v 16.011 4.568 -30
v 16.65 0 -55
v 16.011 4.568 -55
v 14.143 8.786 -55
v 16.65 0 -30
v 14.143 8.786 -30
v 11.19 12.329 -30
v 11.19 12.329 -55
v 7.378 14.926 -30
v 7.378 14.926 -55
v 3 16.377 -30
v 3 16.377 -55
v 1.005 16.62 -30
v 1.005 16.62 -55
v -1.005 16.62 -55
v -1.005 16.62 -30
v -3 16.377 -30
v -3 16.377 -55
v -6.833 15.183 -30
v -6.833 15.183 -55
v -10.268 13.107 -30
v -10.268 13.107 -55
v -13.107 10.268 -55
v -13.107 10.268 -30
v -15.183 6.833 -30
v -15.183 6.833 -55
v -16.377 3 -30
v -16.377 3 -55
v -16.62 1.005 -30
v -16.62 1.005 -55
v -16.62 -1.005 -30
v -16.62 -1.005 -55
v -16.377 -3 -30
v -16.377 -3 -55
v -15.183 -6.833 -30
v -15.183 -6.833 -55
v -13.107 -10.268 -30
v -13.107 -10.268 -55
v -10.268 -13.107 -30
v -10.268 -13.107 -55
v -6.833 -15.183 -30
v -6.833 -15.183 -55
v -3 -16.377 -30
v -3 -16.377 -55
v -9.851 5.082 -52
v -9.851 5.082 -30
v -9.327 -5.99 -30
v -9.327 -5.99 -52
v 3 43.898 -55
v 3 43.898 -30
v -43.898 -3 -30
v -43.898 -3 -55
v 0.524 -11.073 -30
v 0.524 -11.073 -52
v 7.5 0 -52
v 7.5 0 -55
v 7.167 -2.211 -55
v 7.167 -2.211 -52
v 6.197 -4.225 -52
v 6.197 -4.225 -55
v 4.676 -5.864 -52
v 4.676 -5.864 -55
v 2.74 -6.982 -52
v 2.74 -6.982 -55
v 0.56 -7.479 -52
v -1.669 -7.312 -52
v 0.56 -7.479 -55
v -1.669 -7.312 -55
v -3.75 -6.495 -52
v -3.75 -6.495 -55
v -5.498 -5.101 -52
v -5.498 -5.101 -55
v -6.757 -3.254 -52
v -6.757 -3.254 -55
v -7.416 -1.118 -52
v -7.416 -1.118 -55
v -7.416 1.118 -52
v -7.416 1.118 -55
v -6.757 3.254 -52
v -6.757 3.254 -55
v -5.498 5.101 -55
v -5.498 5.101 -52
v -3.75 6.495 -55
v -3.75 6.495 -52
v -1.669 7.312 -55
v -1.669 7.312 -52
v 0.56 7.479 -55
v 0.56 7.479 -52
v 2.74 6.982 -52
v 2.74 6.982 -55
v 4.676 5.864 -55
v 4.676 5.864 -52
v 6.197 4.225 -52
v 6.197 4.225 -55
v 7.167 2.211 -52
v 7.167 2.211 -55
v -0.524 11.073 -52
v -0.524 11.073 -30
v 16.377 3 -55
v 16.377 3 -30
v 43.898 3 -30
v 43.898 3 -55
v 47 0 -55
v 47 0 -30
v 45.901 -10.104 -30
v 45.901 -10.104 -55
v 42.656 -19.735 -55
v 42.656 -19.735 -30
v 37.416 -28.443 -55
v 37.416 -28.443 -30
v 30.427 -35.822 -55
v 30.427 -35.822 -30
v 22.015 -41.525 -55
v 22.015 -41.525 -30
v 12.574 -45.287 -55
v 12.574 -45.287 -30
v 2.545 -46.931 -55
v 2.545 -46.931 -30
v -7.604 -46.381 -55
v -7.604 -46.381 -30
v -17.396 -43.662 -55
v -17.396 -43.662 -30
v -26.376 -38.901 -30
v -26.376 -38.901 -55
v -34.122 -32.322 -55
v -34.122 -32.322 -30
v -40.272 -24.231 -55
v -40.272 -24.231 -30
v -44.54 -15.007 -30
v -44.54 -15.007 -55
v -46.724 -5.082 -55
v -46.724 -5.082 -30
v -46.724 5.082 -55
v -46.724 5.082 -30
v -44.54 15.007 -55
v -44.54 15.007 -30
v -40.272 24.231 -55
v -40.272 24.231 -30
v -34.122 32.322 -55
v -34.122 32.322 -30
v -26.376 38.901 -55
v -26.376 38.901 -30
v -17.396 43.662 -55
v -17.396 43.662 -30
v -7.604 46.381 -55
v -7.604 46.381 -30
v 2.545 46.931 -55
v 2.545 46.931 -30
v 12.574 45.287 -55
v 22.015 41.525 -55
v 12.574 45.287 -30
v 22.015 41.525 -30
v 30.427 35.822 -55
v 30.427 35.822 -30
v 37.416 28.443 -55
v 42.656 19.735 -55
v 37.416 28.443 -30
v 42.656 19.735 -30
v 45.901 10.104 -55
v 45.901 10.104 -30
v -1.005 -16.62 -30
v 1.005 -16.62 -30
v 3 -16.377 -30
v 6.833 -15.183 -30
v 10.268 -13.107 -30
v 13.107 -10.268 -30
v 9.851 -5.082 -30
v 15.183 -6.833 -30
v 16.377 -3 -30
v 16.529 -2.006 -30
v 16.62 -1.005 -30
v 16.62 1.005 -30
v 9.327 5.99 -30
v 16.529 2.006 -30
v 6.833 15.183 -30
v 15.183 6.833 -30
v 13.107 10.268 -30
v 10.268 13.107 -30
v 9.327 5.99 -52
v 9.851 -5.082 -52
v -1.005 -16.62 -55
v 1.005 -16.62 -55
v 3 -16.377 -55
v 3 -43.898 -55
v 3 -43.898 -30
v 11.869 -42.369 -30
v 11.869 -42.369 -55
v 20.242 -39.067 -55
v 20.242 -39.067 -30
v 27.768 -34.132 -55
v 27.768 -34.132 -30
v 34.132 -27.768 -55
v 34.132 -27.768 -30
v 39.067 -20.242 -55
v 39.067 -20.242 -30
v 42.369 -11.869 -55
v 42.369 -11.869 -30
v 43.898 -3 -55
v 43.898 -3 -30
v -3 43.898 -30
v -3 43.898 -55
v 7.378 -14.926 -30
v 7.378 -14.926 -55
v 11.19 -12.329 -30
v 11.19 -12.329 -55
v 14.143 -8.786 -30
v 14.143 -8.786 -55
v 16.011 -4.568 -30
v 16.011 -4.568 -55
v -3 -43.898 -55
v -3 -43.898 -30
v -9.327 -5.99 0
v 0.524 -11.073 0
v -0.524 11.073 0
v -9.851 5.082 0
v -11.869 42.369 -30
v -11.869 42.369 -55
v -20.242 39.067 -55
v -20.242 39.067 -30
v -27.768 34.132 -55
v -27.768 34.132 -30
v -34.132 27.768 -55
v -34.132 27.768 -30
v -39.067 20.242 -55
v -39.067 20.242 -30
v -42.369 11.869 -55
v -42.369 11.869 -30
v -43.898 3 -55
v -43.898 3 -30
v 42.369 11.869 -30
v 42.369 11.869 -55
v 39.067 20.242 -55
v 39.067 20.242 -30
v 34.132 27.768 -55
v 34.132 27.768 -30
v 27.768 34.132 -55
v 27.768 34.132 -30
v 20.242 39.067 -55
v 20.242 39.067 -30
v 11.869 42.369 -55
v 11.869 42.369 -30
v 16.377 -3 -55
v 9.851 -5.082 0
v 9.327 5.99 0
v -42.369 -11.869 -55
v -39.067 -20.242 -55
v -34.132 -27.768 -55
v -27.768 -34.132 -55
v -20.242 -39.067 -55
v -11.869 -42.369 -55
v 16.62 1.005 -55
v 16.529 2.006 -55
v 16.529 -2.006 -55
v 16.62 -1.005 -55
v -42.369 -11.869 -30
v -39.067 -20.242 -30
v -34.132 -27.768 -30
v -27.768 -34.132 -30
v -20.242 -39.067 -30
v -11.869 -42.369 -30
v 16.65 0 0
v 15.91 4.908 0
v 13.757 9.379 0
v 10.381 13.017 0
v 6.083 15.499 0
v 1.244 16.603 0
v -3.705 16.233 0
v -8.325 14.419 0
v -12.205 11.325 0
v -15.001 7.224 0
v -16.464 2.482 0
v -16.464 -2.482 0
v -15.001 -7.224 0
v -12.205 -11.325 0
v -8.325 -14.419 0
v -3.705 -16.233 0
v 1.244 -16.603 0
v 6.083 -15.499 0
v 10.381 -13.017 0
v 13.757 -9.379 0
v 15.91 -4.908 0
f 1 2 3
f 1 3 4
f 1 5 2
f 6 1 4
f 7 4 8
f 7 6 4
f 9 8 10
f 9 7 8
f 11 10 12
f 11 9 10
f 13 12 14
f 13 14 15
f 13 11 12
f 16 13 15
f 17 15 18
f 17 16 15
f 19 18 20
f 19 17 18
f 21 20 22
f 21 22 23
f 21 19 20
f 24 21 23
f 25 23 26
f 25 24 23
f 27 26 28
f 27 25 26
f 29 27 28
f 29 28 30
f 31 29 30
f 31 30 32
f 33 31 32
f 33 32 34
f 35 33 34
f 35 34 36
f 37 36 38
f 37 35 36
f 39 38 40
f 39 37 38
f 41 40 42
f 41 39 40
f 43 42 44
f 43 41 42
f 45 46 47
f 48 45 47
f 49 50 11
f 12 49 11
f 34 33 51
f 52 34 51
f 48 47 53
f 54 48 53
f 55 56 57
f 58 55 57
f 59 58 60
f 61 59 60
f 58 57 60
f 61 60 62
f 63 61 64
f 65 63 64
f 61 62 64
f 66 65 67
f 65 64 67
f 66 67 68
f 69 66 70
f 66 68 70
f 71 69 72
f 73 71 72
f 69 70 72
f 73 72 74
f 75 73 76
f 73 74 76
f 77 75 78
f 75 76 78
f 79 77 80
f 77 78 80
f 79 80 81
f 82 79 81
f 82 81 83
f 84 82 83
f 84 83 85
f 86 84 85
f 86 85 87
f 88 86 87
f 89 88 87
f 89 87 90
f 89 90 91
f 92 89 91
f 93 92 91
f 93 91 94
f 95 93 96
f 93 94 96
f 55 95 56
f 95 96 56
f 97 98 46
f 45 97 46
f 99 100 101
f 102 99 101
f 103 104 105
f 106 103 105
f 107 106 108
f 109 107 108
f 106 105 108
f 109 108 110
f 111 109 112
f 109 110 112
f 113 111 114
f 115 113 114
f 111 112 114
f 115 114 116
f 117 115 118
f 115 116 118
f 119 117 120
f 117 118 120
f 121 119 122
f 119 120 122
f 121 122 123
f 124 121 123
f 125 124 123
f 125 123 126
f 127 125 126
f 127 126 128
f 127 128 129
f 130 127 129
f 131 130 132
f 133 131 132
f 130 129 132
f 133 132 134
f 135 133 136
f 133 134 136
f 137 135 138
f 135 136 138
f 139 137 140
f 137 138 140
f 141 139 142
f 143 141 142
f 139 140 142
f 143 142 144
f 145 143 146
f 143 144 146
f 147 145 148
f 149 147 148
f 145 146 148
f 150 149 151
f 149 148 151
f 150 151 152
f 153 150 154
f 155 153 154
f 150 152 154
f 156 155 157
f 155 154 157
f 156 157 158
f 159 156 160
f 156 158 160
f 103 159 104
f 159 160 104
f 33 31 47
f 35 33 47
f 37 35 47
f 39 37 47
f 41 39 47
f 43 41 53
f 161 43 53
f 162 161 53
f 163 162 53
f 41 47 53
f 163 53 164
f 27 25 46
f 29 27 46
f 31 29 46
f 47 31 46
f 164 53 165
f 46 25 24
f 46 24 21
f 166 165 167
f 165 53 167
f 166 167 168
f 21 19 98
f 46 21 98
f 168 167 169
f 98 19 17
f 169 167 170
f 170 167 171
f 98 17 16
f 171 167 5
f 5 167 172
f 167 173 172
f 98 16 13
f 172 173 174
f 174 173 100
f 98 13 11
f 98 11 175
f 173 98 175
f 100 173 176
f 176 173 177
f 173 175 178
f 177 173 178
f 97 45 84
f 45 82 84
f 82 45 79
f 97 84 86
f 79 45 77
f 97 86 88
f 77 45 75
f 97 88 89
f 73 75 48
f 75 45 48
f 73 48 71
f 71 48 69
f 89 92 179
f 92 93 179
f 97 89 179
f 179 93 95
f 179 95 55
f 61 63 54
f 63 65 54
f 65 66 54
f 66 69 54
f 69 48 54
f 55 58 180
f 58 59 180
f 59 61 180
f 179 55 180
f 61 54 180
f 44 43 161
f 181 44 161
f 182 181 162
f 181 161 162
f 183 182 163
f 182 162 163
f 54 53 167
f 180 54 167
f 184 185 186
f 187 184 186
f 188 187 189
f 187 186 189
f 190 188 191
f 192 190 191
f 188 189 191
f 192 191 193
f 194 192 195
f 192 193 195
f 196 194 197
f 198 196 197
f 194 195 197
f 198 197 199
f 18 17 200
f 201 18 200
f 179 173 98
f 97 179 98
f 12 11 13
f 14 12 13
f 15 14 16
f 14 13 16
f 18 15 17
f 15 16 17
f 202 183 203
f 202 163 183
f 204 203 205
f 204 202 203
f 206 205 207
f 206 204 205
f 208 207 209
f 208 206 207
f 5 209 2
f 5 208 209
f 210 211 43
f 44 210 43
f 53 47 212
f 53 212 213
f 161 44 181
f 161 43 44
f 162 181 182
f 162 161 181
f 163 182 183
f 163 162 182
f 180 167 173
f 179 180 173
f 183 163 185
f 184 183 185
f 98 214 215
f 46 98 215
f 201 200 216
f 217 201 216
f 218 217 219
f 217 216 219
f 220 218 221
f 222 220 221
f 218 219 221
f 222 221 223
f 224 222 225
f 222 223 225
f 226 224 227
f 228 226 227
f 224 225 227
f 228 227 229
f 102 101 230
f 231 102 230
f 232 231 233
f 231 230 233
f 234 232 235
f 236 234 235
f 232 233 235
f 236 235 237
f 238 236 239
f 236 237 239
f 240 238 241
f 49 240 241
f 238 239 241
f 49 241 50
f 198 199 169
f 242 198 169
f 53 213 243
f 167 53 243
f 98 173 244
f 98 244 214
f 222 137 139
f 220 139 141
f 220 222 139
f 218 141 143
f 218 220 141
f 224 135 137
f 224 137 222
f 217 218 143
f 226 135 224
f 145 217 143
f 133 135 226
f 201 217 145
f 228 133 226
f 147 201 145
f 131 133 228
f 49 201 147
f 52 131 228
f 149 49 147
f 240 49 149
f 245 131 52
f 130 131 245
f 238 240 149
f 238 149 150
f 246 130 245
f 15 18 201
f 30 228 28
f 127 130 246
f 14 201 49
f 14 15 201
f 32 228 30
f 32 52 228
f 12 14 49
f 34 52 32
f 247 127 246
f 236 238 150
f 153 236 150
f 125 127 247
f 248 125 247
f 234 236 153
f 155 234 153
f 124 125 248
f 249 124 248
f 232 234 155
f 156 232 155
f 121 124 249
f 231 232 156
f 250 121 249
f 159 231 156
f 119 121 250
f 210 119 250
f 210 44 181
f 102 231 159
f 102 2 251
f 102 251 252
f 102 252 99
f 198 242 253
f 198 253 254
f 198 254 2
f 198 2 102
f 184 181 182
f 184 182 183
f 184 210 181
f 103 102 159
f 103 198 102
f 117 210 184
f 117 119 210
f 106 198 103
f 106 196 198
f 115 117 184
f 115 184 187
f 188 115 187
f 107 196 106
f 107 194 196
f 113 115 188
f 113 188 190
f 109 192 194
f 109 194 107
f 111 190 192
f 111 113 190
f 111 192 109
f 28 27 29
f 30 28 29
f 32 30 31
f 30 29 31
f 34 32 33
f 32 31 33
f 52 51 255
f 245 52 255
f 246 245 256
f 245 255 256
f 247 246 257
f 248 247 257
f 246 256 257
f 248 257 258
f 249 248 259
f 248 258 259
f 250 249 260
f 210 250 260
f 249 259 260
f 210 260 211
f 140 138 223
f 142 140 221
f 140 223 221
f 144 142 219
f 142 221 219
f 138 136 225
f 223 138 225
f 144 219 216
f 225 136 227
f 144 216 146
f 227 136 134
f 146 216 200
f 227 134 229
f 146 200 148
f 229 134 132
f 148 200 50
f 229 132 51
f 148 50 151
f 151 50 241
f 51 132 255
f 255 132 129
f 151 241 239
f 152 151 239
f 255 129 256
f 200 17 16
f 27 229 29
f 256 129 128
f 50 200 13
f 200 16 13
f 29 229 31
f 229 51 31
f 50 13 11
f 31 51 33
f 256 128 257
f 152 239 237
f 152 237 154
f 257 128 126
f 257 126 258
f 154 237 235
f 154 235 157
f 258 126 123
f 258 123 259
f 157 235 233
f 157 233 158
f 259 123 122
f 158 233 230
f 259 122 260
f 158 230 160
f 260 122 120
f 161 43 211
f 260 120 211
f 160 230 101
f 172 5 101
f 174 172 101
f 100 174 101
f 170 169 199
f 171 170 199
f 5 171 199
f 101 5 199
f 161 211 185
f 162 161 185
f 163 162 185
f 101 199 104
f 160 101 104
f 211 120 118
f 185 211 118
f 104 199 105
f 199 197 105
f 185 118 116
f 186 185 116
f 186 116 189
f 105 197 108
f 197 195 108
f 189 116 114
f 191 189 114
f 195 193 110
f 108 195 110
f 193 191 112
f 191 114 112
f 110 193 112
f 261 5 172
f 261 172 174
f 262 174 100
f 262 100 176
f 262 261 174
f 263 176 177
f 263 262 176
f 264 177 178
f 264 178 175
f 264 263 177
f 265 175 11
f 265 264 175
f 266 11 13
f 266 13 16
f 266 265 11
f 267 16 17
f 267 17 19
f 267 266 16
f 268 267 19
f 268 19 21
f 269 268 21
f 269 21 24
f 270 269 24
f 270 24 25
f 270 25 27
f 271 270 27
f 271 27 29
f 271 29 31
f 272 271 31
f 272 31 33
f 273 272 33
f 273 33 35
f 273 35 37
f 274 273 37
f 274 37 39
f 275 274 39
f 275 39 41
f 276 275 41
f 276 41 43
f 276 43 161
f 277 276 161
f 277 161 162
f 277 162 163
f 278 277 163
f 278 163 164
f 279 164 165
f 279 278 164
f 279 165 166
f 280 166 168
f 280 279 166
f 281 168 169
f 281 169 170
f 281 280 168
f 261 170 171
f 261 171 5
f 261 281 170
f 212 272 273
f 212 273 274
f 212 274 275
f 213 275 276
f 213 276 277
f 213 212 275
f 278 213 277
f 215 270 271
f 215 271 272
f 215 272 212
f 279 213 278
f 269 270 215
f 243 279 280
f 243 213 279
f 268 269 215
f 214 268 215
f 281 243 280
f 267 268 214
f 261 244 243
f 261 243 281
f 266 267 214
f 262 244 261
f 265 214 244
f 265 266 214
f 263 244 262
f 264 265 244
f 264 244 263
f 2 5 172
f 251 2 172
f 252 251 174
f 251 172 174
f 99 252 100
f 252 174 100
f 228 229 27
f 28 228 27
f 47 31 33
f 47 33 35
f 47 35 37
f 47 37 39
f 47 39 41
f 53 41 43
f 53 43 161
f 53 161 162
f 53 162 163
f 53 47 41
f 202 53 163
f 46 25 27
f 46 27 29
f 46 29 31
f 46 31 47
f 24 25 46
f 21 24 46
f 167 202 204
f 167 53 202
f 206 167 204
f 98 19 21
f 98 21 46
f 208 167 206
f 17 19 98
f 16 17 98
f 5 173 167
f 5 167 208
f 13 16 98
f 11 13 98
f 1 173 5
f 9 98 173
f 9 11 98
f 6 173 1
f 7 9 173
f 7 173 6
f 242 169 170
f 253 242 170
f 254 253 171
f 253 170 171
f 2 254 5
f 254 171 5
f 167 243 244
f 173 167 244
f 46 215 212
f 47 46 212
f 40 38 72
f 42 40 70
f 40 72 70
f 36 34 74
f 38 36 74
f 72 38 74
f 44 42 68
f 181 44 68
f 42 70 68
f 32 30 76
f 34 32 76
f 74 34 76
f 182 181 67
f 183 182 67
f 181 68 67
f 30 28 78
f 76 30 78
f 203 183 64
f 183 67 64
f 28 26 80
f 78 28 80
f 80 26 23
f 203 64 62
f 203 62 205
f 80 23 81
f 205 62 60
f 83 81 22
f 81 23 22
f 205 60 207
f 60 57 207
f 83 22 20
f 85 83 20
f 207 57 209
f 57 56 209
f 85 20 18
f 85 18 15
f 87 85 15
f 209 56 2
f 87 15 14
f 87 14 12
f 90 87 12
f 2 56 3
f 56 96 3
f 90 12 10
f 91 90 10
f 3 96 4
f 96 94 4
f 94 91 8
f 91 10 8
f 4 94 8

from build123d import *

# Parameters (mm, degrees)
F1_R      = 16.65
F2_DEPTH  = 30
F3_DEPTH  = 31
F4_R      = 7.5
F5_DEPTH  = 25
F6_R      = 47
F7_DEPTH  = 25
F8_DEPTH  = 25
F9_R      = 14.0491695585
F9_R_2    = 7.5
F10_DEPTH = 3


with BuildPart() as f2:
    # F1 (on Top) → F2 (new body)
    with BuildSketch(Plane.XY):
        Circle(F1_R)
    extrude(amount=-F2_DEPTH)

    # F0 (on Top) → F3 (cut)
    with BuildSketch(Plane.XY):
        Polygon((-0.5242376146, 11.0727221099), (-9.8513774435, 5.0823579631), (-9.327139829, -5.9903641468), (0.5242376146, -11.0727221099), (9.8513774435, -5.0823579631), (9.327139829, 5.9903641468), align=None)
    extrude(amount=-F3_DEPTH, mode=Mode.SUBTRACT)

    # F4 (on face) → F5 (cut)
    with BuildSketch(Plane(origin=(0, 0, -30), x_dir=(1, 0, 0), z_dir=(0, 0, -1))):
        Circle(F4_R)
    extrude(amount=-F5_DEPTH, mode=Mode.SUBTRACT)

    # F6 (on face) → F7 (join)
    with BuildSketch(Plane(origin=(0, 0, -30), x_dir=(1, 0, 0), z_dir=(0, 0, -1))):
        Circle(F6_R)
        with BuildLine():
            ThreePointArc((43.8976081353, 3), (43.9743945834, 1.5008734202), (44, 0))
            ThreePointArc((44, 0), (43.9743945834, -1.5008734202), (43.8976081353, -3))
            ThreePointArc((43.8976081353, -3), (31.1126983722, -31.1126983722), (3, -43.8976081353))
            ThreePointArc((3, -43.8976081353), (0, -44), (-3, -43.8976081353))
            ThreePointArc((-3, -43.8976081353), (-31.1126983722, -31.1126983722), (-43.8976081353, -3))
            ThreePointArc((-43.8976081353, -3), (-44, 0), (-43.8976081353, 3))
            ThreePointArc((-43.8976081353, 3), (-31.1126983722, 31.1126983722), (-3, 43.8976081353))
            ThreePointArc((-3, 43.8976081353), (0, 44), (3, 43.8976081353))
            ThreePointArc((3, 43.8976081353), (31.1126983722, 31.1126983722), (43.8976081353, 3))
        make_face(mode=Mode.SUBTRACT)
        with BuildLine():
            ThreePointArc((-3, -43.8976081353), (0, -44), (3, -43.8976081353))
            Line((3, -43.8976081353), (3, -16.3774998092))
            ThreePointArc((3, -16.3774998092), (0, -16.65), (-3, -16.3774998092))
            Line((-3, -16.3774998092), (-3, -43.8976081353))
        make_face()
        with BuildLine():
            ThreePointArc((43.8976081353, -3), (43.9743945834, -1.5008734202), (44, 0))
            ThreePointArc((44, 0), (43.9743945834, 1.5008734202), (43.8976081353, 3))
            Line((43.8976081353, 3), (16.3774998092, 3))
            ThreePointArc((16.3774998092, 3), (16.5817350091, 1.506175318), (16.65, 0))
            ThreePointArc((16.65, 0), (16.5817350091, -1.506175318), (16.3774998092, -3))
            Line((16.3774998092, -3), (43.8976081353, -3))
        make_face()
        with BuildLine():
            Line((-16.3774998092, 3), (-43.8976081353, 3))
            ThreePointArc((-43.8976081353, 3), (-44, 0), (-43.8976081353, -3))
            Line((-43.8976081353, -3), (-16.3774998092, -3))
            ThreePointArc((-16.3774998092, -3), (-16.65, 0), (-16.3774998092, 3))
        make_face()
        with BuildLine():
            Line((3, 16.3774998092), (3, 43.8976081353))
            ThreePointArc((3, 43.8976081353), (0, 44), (-3, 43.8976081353))
            Line((-3, 43.8976081353), (-3, 16.3774998092))
            ThreePointArc((-3, 16.3774998092), (0, 16.65), (3, 16.3774998092))
        make_face()
    extrude(amount=F7_DEPTH)


with BuildPart() as f8:
    # F8 (new): a face of the model
    f8_faces = [f2.part.faces().sort_by_distance(p)[0] for p in [
        (16.1127327183, 1.4635742467, -30),
    ]]
    extrude(f8_faces, amount=F8_DEPTH)

    # F9 (on face) → F10 (join)
    with BuildSketch(Plane(origin=(0, 0, -55), x_dir=(1, 0, 0), z_dir=(0, 0, -1))):
        Circle(F9_R)
        Polygon((0.5242376146, 11.0727221099), (9.8513774435, 5.0823579631), (9.327139829, -5.9903641468), (-0.5242376146, -11.0727221099), (-9.8513774435, -5.0823579631), (-9.327139829, 5.9903641468), align=None, mode=Mode.SUBTRACT)
        Polygon((9.327139829, -5.9903641468), (9.8513774435, 5.0823579631), (0.5242376146, 11.0727221099), (-9.327139829, 5.9903641468), (-9.8513774435, -5.0823579631), (-0.5242376146, -11.0727221099), align=None)
        Circle(F9_R_2, mode=Mode.SUBTRACT)
    extrude(amount=-F10_DEPTH)


solid = Compound([f2.part, f8.part])
